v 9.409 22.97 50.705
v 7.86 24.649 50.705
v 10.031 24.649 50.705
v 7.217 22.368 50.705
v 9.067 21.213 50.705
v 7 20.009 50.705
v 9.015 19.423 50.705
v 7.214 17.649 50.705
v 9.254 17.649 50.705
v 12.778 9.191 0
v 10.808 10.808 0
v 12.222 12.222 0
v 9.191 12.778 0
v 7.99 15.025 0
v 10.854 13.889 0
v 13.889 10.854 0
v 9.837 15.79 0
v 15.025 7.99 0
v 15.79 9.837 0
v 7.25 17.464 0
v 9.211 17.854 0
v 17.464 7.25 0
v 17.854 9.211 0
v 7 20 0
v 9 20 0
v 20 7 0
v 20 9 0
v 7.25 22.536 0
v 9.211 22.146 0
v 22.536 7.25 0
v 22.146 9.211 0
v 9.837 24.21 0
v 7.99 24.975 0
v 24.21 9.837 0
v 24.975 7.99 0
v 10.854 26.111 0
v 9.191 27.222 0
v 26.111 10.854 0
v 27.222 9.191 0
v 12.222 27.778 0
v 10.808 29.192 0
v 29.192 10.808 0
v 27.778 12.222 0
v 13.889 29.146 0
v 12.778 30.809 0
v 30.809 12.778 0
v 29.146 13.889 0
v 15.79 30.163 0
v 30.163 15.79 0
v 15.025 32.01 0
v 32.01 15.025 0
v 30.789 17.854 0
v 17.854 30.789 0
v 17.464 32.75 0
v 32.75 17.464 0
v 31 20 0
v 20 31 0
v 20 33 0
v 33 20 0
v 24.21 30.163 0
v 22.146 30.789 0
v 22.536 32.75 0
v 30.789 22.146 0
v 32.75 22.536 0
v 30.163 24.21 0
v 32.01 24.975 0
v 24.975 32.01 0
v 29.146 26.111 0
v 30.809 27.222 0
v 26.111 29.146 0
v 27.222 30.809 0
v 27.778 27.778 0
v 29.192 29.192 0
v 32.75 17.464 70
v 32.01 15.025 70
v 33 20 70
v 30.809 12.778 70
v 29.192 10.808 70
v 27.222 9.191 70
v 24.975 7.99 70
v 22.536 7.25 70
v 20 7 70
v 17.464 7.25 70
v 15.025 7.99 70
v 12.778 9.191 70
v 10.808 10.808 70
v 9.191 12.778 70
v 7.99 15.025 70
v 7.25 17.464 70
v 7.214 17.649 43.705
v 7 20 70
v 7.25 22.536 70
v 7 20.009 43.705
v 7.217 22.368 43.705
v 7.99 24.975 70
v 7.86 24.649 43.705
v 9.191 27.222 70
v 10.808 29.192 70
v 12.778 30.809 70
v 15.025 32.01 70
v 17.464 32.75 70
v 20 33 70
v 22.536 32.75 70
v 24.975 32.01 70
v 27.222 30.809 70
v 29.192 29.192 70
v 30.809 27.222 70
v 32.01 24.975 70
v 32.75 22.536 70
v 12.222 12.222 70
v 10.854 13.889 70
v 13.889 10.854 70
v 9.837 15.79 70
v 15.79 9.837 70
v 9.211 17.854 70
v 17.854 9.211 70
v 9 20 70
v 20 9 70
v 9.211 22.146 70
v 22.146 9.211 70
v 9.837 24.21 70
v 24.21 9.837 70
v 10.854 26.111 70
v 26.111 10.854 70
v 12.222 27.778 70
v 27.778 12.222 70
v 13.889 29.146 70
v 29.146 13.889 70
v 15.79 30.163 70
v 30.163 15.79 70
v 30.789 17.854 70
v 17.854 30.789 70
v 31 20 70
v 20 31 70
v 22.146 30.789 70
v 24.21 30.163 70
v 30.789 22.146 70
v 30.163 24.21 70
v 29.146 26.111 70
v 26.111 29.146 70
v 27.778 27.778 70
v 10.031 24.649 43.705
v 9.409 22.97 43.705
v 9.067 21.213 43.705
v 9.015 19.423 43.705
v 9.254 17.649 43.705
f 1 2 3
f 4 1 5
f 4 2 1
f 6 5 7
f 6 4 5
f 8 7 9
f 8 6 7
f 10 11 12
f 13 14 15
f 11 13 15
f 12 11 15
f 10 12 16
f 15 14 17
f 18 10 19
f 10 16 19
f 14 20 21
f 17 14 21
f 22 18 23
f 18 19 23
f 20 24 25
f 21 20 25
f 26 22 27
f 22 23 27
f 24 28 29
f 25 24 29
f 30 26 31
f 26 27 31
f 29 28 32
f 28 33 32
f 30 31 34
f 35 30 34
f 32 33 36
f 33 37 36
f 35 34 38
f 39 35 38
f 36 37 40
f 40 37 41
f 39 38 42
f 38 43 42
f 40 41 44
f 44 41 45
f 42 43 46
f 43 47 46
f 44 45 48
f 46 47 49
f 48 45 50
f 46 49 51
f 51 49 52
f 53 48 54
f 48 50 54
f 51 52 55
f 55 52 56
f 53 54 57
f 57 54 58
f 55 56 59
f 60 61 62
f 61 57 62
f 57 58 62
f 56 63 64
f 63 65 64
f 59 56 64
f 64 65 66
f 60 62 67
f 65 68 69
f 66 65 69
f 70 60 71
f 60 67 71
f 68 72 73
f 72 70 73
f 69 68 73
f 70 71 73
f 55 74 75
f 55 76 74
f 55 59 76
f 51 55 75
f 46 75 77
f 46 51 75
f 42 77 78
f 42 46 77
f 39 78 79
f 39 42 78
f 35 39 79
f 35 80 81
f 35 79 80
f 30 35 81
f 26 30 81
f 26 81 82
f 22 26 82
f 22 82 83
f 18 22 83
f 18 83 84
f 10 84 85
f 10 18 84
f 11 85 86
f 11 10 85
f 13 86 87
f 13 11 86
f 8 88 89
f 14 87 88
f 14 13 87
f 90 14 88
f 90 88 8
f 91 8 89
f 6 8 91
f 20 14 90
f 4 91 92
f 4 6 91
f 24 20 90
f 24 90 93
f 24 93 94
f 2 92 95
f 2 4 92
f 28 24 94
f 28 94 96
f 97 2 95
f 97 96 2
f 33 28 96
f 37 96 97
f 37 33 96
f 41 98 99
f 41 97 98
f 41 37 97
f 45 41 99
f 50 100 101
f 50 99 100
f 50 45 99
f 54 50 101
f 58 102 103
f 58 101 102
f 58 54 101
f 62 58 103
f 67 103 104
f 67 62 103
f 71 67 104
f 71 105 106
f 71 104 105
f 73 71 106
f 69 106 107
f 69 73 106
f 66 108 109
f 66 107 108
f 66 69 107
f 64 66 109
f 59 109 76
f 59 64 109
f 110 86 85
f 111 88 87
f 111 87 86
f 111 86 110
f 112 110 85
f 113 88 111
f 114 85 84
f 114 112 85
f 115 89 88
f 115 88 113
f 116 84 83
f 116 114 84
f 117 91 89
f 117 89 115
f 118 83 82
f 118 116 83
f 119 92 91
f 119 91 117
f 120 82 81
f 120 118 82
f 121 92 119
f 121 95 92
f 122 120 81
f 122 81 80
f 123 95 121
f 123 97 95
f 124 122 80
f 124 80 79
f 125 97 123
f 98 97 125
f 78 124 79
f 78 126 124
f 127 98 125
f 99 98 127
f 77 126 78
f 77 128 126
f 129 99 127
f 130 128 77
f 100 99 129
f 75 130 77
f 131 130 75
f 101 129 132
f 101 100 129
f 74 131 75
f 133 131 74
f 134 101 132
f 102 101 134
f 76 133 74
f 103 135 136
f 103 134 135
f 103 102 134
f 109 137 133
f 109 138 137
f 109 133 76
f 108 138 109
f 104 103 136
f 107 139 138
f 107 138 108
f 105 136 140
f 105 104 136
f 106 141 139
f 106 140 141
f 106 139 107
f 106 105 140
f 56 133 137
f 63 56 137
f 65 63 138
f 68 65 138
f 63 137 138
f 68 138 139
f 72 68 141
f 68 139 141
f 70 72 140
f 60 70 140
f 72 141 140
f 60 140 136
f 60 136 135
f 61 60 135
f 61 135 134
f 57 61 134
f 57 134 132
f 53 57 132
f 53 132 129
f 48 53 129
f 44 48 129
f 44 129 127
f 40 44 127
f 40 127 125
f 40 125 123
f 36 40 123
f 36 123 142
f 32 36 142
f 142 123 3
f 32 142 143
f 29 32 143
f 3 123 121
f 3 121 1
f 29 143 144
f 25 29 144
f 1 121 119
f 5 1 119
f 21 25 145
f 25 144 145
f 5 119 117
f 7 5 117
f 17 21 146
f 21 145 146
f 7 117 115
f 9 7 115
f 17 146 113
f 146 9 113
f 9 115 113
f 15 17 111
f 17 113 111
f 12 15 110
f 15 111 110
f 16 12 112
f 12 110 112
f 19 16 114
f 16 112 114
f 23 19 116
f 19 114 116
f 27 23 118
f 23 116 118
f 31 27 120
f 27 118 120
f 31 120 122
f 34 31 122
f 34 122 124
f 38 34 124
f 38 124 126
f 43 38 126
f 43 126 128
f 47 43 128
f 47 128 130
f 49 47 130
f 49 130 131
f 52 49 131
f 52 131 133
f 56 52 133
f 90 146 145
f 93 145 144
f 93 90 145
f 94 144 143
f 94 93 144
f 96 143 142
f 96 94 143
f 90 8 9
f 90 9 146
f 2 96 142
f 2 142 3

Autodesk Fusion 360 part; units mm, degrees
sketch "Sketch1" plane through (0, 0, 0) normal (0, 0, 1) x (1, 0, 0)
  circle A0 centre (20, 20) radius 13
  dimension "d1" = 26
extrude "Extrude1" add sketch "Sketch1" along normal blind 70
sketch "Sketch2" plane through (0, 0, 70) normal (0, 0, 1) x (1, 0, 0)
  circle A0 centre (20, 20) radius 13
  circle A1 centre (20, 20) radius 11
  dimension "d4" = 2
extrude "Extrude2" cut sketch "Sketch2" against normal up to surface (70 mm away) contours A1
sketch "Sketch3" plane through (0, 0, 0) normal (1, 0, 0) x (0, 0, -1)
  line L0 (-50.7051, 17.6488) -> (-43.7051, 17.6488)
  line L1 (-43.7051, 17.6488) -> (-43.7051, 24.6488)
  line L2 (-43.7051, 24.6488) -> (-50.7051, 24.6488)
  line L3 (-50.7051, 24.6488) -> (-50.7051, 17.6488)
  line L4 (-50.7051, 17.6488) -> (-43.7051, 24.6488) construction
  line L5 (-43.7051, 17.6488) -> (-50.7051, 24.6488) construction
  point P0 (-47.2051, 21.1488)
  dimension "d7" = 7
  dimension "d8" = 7
extrude "Extrude4" cut sketch "Sketch3" along normal blind 15
extrude "Extrude3" cut sketch "Sketch3" along normal blind 12
